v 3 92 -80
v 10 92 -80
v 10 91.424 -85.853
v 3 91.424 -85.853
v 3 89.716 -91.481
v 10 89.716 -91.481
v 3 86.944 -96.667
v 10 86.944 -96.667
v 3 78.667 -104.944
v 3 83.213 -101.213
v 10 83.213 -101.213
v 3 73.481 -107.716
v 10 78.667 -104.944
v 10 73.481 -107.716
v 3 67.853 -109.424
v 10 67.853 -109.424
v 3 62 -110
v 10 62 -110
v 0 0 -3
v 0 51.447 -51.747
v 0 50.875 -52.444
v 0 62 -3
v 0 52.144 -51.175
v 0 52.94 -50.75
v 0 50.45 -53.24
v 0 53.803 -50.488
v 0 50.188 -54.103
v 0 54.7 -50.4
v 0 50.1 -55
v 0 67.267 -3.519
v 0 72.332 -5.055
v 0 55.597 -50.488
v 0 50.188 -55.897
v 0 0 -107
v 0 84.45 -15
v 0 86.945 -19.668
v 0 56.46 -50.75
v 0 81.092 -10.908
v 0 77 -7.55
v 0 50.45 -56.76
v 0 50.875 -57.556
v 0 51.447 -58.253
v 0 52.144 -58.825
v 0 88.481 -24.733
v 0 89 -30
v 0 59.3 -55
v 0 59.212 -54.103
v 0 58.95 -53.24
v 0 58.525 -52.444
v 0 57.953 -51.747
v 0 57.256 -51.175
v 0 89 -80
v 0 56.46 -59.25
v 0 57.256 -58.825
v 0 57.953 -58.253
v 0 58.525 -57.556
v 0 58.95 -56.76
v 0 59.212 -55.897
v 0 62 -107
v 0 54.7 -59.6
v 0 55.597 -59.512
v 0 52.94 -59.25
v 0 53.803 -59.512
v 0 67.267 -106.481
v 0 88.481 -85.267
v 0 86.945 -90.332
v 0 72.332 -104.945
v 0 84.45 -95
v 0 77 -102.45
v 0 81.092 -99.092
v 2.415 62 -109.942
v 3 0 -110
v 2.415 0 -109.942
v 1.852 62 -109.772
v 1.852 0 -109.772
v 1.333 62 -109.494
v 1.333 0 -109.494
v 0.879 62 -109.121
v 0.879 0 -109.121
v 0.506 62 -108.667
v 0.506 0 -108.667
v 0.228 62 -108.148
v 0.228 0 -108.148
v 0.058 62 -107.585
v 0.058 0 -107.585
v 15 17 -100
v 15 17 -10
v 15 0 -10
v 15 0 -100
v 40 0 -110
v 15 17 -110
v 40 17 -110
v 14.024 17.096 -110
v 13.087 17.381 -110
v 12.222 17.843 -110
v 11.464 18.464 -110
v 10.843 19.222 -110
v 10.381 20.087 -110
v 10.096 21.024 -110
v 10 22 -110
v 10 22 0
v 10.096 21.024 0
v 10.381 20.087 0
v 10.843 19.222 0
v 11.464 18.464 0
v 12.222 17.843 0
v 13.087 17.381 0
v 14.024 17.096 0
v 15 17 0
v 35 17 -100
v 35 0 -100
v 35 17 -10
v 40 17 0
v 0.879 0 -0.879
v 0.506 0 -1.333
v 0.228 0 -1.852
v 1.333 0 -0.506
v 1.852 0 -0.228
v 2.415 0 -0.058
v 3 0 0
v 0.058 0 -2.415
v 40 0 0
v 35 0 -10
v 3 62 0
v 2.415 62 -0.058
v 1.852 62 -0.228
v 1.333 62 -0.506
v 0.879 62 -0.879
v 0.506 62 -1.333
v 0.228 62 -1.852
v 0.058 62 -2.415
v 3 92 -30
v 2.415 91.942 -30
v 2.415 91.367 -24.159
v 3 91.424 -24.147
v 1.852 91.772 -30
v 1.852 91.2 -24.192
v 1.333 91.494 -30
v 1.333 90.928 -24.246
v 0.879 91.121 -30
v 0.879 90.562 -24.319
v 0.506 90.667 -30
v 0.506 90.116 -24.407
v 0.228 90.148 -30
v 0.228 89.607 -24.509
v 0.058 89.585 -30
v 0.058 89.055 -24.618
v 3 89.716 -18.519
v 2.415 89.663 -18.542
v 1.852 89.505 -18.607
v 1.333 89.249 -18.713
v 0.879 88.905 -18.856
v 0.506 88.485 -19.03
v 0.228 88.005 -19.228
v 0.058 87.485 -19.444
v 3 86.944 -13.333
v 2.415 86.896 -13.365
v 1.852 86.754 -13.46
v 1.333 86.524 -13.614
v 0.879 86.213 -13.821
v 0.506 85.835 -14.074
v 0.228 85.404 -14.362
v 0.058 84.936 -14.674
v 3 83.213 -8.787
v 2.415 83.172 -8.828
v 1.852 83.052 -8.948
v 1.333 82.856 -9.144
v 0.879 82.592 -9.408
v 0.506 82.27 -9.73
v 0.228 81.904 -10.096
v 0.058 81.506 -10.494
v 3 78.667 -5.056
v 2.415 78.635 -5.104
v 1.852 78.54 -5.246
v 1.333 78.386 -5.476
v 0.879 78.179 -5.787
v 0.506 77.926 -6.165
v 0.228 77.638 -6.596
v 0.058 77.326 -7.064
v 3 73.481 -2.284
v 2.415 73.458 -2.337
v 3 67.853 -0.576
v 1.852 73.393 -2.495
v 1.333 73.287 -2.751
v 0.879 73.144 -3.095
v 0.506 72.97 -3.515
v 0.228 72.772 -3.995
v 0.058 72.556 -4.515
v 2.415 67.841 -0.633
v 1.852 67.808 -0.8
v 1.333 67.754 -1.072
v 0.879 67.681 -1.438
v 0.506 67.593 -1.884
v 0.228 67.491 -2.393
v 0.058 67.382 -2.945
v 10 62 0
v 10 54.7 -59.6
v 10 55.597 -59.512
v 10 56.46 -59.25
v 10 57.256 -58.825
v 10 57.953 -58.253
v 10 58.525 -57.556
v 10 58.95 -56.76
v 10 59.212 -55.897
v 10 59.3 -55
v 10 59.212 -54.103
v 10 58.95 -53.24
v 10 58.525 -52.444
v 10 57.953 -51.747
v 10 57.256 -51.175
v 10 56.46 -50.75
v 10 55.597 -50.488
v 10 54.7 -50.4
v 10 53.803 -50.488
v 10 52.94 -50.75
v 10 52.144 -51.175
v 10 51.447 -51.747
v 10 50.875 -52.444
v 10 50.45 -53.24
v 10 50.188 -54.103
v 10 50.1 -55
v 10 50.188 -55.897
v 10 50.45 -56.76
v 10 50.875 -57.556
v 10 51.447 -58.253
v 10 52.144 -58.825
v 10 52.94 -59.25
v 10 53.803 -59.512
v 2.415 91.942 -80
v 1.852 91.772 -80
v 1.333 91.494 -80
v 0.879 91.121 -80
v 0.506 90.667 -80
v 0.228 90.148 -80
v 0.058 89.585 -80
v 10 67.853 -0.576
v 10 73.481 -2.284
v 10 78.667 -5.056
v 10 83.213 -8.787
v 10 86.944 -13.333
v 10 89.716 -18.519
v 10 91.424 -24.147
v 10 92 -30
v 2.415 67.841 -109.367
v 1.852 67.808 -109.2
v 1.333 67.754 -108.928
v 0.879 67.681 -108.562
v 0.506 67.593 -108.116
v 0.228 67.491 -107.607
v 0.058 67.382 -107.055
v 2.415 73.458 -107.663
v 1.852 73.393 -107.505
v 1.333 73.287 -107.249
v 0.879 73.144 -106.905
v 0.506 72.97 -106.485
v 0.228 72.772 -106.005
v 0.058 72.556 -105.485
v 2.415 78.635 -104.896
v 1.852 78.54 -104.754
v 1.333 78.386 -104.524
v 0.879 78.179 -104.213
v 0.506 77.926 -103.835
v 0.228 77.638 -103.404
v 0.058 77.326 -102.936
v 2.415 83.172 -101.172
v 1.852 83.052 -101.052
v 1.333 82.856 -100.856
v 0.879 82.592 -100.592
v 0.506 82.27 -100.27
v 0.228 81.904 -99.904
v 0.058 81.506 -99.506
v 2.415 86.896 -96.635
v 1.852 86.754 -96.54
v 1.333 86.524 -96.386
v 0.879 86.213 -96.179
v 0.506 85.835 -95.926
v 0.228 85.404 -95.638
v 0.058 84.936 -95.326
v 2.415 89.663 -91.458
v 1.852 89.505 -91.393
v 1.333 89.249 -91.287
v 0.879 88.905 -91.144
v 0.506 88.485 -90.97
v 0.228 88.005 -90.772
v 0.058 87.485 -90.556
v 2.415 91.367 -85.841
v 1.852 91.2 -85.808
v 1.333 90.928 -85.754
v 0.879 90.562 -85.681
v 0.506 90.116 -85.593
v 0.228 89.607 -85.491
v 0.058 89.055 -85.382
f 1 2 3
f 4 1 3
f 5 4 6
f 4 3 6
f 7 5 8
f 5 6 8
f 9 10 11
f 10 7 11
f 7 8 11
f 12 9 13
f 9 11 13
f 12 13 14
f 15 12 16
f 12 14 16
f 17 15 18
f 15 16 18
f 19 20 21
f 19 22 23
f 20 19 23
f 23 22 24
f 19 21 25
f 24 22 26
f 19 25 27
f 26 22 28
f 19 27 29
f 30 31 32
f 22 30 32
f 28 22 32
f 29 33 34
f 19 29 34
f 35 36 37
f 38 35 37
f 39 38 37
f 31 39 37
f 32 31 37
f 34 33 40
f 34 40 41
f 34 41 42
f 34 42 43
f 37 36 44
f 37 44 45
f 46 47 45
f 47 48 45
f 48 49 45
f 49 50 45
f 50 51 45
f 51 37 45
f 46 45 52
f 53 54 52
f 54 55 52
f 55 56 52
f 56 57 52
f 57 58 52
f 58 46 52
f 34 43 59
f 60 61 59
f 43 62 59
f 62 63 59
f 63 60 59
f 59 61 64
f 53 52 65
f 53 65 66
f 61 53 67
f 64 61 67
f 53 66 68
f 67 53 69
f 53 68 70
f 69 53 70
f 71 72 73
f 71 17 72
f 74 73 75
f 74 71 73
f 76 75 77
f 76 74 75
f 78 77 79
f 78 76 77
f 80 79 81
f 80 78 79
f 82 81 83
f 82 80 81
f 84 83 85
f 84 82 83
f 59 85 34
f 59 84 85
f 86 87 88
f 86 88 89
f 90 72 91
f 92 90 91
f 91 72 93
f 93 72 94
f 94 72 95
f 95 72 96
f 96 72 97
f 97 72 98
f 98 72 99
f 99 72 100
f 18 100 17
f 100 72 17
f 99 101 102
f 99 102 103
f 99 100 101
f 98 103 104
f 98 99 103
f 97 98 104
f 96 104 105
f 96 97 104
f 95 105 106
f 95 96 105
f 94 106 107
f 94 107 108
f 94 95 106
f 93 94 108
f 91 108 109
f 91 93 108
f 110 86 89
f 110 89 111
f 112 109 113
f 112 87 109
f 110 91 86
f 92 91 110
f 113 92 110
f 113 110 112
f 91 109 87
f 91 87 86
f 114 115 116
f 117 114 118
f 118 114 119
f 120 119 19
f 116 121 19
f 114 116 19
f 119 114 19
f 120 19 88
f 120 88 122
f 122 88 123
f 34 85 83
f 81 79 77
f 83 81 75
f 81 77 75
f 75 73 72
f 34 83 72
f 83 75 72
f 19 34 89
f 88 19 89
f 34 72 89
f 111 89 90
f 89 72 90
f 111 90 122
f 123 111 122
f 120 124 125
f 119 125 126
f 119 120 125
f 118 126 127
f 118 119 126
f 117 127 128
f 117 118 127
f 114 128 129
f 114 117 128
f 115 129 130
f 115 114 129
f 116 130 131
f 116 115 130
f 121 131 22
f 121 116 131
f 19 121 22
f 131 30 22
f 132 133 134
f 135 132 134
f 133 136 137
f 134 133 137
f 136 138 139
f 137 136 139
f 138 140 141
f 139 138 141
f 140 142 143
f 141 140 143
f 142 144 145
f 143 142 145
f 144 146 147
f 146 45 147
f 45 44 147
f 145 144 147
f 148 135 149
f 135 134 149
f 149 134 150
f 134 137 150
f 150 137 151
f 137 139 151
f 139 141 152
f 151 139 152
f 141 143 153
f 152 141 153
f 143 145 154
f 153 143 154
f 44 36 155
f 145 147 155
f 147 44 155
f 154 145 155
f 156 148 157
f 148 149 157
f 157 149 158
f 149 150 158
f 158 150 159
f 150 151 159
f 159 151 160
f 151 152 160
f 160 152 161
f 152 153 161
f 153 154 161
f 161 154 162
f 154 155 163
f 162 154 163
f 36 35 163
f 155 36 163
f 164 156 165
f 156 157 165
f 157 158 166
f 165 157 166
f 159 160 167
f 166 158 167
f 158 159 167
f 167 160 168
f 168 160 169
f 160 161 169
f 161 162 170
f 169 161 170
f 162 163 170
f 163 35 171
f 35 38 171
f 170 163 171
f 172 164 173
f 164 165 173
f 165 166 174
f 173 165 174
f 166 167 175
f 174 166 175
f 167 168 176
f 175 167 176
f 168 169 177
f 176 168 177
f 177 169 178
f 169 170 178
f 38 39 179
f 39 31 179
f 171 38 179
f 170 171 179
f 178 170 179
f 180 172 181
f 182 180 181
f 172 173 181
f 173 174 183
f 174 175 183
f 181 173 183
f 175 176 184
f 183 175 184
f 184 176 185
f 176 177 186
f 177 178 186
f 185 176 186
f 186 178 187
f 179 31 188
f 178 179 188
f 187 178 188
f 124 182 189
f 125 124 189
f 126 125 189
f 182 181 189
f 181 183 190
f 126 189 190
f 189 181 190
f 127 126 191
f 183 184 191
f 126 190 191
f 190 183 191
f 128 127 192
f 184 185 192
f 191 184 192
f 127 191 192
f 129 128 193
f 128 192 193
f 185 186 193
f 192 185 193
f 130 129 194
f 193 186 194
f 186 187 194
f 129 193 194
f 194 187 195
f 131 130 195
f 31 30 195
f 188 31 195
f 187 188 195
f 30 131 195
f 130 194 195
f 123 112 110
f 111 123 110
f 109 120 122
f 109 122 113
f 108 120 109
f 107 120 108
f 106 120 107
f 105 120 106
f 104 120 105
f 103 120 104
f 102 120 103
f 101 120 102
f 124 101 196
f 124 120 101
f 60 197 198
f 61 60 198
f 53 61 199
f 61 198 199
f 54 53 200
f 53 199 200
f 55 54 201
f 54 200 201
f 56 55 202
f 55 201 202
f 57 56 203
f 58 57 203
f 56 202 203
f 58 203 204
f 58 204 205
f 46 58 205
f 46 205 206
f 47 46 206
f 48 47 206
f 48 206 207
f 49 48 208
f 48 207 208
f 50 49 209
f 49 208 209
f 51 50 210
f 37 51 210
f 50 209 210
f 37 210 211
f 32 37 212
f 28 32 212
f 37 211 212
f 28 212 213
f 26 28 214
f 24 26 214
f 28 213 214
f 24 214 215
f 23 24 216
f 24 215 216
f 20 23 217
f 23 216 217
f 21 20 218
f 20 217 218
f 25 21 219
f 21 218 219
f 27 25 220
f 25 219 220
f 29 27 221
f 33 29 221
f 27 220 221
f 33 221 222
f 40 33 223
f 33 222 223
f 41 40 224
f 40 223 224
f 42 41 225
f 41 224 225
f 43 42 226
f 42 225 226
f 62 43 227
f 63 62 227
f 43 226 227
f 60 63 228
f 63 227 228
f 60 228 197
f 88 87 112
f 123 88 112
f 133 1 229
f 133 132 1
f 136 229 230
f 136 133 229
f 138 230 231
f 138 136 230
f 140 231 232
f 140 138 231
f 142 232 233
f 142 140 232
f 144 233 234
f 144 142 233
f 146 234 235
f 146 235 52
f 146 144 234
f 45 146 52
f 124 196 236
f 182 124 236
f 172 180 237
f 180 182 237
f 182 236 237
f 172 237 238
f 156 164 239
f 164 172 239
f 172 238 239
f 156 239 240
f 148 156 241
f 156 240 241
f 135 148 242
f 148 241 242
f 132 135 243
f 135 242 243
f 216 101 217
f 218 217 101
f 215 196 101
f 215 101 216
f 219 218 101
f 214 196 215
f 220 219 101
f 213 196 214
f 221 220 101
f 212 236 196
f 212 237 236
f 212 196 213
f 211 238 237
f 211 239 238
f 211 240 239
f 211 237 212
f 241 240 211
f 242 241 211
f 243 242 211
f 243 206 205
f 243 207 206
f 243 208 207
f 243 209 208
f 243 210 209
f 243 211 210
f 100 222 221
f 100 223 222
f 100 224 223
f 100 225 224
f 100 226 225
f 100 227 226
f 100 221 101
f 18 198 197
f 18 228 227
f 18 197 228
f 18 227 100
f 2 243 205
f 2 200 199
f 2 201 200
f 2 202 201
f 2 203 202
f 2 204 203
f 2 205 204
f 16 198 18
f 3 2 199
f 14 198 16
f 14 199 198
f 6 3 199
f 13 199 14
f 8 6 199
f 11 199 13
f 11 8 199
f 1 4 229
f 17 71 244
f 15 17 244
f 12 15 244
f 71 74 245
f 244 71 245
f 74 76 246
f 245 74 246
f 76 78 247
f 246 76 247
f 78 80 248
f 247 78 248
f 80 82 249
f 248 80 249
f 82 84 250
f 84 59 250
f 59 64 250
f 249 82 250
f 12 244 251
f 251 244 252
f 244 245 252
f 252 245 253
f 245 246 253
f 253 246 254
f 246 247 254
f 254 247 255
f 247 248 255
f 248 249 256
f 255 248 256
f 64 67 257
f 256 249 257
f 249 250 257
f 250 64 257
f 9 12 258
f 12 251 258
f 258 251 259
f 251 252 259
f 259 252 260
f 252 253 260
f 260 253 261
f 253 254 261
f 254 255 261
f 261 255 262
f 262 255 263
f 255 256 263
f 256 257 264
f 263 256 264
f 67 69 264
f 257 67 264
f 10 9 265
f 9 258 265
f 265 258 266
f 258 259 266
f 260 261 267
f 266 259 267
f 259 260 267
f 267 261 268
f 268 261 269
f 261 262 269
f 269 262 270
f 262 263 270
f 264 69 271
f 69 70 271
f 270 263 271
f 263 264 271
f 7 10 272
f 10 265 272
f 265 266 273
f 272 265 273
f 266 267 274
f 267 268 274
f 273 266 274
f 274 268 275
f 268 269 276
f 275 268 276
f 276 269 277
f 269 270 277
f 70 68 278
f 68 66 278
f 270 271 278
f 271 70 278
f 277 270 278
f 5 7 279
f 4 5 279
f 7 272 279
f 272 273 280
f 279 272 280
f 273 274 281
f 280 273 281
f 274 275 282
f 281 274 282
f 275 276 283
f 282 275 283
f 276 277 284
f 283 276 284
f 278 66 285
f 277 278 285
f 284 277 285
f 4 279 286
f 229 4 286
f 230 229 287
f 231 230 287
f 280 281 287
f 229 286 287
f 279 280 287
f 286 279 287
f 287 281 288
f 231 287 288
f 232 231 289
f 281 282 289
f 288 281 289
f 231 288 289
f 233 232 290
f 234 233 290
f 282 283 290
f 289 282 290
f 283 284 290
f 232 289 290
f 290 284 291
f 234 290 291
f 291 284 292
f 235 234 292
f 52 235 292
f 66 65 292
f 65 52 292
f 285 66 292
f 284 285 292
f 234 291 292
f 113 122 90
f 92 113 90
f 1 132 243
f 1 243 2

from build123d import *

# Parameters (mm, degrees)
SKETCH1_W           = 40
SKETCH1_H           = 110
BOSS_EXTRUDE1_DEPTH = 17
SKETCH4_W           = 110
SKETCH4_H           = 75
BOSS_EXTRUDE2_DEPTH = 10
SKETCH5_W           = 20
SKETCH5_H           = 90
CUT_EXTRUDE1_DEPTH  = 17
SKETCH6_R           = 4.6
CUT_EXTRUDE2_DEPTH  = 10
FILLET1_R           = 30
FILLET2_R           = 3
FILLET3_R           = 5


with BuildPart() as part:
    # Sketch1 → Boss-Extrude1 (new body)
    with BuildSketch(Plane(origin=(0, 0, 0), x_dir=(1, 0, 0), z_dir=(0, 1, 0))):
        with Locations((20, 55)):
            Rectangle(SKETCH1_W, SKETCH1_H)
    extrude(amount=BOSS_EXTRUDE1_DEPTH)

    # Sketch4 → Boss-Extrude2 (add)
    with BuildSketch(Plane(origin=(0, 0, 0), x_dir=(0, 0, -1), z_dir=(1, 0, 0))):
        with Locations((55, 54.5)):
            Rectangle(SKETCH4_W, SKETCH4_H)
    extrude(amount=BOSS_EXTRUDE2_DEPTH)

    # Sketch5 → Cut-Extrude1 (cut)
    with BuildSketch(Plane(origin=(0, 17, 0), x_dir=(1, 0, 0), z_dir=(0, 1, 0))):
        with Locations((25, 55)):
            Rectangle(SKETCH5_W, SKETCH5_H)
    extrude(amount=-CUT_EXTRUDE1_DEPTH, mode=Mode.SUBTRACT)

    # Sketch6 → Cut-Extrude2 (cut)
    with BuildSketch(Plane(origin=(10, 0, 0), x_dir=(0, 0, -1), z_dir=(1, 0, 0))):
        with Locations((55, 54.7)):
            Circle(SKETCH6_R)
    extrude(amount=-CUT_EXTRUDE2_DEPTH, mode=Mode.SUBTRACT)

    # Fillet1
    fillet1_edges = [part.edges().sort_by_distance(p)[0] for p in [
        (5, 92, 0),
        (5, 92, -110),
    ]]
    fillet(fillet1_edges, radius=FILLET1_R)

    # Fillet2
    fillet2_edges = [part.edges().sort_by_distance(p)[0] for p in [
        (0, 31, 0),
        (0, 92, -55),
        (0, 31, -110),
        (0, 83.213203436, -101.213203436),
        (0, 83.213203436, -8.786796564),
    ]]
    fillet(fillet2_edges, radius=FILLET2_R)

    # Fillet3
    fillet3_edges = [part.edges().sort_by_distance(p)[0] for p in [
        (10, 17, -55),
    ]]
    fillet(fillet3_edges, radius=FILLET3_R - 0.0001)  # a hair under: the kernel refuses the full size


solid = part.part
